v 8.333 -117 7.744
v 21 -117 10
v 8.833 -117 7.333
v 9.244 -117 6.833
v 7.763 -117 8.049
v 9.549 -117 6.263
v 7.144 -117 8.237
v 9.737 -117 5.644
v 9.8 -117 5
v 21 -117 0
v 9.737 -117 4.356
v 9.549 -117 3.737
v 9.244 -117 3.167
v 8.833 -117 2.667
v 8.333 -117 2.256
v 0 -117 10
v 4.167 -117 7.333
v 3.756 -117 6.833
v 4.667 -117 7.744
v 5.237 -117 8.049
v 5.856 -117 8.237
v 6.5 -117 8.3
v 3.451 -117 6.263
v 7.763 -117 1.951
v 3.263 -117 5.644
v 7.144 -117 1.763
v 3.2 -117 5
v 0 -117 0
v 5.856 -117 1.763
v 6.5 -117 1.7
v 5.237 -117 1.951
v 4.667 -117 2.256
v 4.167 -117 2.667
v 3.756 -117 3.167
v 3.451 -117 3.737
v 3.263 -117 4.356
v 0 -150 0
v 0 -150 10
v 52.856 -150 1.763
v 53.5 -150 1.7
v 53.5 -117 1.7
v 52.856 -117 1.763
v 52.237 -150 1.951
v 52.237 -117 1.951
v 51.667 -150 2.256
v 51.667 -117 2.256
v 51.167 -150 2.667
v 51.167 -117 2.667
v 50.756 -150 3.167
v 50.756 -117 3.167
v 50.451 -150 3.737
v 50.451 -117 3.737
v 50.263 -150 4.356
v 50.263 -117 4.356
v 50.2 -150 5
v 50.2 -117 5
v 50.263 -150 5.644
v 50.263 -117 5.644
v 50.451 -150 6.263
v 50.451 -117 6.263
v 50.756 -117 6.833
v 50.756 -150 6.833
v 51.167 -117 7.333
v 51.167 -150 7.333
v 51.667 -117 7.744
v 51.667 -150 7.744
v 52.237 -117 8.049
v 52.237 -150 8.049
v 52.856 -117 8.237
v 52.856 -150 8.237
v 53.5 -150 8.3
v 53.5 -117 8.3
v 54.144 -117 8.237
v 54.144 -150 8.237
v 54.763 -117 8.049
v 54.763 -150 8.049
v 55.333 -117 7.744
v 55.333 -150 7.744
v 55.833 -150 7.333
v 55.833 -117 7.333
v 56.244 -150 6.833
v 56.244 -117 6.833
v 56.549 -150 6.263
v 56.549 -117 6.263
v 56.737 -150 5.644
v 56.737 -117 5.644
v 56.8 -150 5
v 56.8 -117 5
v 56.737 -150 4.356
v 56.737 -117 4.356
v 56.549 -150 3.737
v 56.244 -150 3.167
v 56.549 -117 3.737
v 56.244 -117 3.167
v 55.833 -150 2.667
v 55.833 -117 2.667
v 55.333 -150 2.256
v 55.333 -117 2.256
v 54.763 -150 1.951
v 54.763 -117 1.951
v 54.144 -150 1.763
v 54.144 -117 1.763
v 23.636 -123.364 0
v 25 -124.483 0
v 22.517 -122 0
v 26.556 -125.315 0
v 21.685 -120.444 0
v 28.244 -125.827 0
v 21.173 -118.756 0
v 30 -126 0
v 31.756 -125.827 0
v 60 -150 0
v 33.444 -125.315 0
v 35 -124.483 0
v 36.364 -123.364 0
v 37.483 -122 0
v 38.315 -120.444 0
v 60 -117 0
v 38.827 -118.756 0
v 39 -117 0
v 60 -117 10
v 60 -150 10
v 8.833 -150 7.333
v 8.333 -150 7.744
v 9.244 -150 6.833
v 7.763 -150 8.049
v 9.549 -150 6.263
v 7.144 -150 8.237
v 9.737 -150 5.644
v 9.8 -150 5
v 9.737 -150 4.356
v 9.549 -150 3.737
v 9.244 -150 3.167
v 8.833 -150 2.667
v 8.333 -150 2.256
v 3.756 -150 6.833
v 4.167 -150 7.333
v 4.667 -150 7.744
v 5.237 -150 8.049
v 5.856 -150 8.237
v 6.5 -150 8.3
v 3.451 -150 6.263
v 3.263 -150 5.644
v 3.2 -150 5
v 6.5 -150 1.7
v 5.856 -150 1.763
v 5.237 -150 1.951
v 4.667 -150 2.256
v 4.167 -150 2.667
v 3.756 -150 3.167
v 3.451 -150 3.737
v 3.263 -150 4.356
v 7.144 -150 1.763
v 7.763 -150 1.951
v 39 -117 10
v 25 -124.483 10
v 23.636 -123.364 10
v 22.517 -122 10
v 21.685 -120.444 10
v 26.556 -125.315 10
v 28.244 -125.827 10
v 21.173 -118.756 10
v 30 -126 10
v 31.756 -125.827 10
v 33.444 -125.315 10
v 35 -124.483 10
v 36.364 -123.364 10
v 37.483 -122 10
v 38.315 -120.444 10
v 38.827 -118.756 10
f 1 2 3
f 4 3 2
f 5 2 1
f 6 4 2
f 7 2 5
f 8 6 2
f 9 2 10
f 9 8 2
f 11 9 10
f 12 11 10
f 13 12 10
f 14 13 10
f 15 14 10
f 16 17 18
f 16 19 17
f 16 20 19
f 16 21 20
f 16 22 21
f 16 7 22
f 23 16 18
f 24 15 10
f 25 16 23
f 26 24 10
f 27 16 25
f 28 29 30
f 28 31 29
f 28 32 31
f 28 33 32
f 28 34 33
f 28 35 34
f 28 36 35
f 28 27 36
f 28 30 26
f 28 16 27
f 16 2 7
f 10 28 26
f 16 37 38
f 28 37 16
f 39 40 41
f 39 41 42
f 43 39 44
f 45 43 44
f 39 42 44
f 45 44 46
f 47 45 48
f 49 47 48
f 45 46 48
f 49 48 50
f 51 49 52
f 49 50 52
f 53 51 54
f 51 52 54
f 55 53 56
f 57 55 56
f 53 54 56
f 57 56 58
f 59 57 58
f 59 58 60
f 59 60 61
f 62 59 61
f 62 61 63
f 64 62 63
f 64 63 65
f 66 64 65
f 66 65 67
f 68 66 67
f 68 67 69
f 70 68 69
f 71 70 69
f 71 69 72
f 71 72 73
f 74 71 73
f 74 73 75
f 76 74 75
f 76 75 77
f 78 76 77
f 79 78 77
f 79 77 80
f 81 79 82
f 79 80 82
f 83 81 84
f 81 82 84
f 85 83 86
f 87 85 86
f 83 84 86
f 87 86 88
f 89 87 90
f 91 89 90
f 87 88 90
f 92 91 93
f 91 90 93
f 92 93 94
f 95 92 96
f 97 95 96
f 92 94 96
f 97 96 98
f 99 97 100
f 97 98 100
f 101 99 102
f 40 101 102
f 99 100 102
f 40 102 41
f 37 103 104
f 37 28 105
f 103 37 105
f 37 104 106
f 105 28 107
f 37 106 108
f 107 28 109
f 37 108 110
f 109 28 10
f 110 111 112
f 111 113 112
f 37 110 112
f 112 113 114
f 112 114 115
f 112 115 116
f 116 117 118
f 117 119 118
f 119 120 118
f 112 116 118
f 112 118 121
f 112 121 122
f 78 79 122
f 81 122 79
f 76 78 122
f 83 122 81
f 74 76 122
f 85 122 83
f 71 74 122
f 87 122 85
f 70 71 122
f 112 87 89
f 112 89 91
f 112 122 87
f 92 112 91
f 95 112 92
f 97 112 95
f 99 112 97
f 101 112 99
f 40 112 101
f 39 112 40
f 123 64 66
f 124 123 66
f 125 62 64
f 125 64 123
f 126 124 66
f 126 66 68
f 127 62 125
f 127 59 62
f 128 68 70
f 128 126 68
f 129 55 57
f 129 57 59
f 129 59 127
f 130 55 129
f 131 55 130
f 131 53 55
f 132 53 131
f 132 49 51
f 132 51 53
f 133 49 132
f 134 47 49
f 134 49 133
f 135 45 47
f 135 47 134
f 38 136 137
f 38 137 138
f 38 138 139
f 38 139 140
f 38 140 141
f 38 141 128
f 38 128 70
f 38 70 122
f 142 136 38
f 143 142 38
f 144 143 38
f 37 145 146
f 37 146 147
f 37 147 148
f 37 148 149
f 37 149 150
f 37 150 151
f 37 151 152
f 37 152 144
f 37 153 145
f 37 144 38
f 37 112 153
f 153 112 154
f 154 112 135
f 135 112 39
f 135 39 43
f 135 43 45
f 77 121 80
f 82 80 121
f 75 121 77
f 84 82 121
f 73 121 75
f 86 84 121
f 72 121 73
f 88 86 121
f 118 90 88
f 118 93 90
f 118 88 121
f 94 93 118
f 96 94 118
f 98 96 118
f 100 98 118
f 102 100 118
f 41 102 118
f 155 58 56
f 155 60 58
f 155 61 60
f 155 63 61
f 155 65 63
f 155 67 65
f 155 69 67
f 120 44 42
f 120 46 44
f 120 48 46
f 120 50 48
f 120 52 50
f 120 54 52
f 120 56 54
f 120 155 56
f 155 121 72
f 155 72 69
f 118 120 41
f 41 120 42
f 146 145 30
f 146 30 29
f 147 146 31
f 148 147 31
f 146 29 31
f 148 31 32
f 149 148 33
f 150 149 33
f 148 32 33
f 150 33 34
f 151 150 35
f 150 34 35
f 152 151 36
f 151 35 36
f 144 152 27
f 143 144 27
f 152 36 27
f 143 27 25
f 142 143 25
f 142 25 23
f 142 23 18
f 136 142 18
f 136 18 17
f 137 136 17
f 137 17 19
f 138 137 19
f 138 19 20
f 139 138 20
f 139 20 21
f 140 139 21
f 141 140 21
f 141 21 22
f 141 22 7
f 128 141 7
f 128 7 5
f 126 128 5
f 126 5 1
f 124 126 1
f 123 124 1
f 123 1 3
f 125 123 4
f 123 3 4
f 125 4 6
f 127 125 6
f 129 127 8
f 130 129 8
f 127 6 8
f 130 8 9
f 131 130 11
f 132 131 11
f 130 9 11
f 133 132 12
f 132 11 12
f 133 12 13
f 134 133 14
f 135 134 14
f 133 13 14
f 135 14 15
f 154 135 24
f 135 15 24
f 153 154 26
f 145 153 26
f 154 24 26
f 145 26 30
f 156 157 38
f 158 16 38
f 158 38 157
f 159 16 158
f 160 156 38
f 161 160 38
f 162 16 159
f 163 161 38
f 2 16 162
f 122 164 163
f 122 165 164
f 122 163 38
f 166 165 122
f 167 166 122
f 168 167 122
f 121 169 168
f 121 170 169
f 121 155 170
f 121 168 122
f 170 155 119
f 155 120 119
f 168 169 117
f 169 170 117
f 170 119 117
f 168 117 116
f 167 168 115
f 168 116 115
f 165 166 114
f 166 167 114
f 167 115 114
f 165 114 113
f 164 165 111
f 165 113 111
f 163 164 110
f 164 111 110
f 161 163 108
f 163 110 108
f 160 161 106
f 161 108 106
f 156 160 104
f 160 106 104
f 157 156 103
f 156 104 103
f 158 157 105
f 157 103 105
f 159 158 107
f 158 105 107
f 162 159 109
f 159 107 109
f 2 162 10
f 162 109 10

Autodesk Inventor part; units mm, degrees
ref_plane "YZ Plane" through (0, 0, 0) normal (1, 0, 0) x (0, 1, 0)
ref_plane "XZ Plane" through (0, 0, 0) normal (0, 1, 0) x (-1, 0, 0)
sketch "Skizze1" plane through (0, 0, 0) normal (0, 0, 1) x (1, 0, 0)
  line L0 (0, 0) -> (60, 0)
  line L1 (60, 0) -> (60, -150)
  line L2 (60, -150) -> (0, -150)
  line L3 (0, -150) -> (0, 0)
  circle A0 centre (30, -117) radius 9
  dimension "d0" = 60
  dimension "d1" = 150
  dimension "d2" = 18
extrude "Extrusion1" add sketch "Skizze1" along normal blind 10
sketch "Skizze2" plane through (0, -150, 0) normal (0, -1, 0) x (1, 0, 0)
  point P0 (0, 0)
  point P1 (6.5, 5)
  point P2 (53.5, 5)
sketch "Skizze3" plane through (0, 0, 0) normal (0, 0, -1) x (-1, 0, 0)
  line L0 (-5, -117) -> (-55, -117)
  point P0 (0, 0)
ref_plane "Arbeitsebene1" through (5, -117, 0) normal (0, 1, 0) x (1, 0, 0)
split "Trennen1" plane through (5, -117, 0) removes the side toward (0, 1, 0)
hole "Bohrung2" at (6.5, -150, 5) at (53.5, -150, 5) direction (0, 1, 0) diameter 6.6 end through all
properties part number "Steher oben Rohr"
